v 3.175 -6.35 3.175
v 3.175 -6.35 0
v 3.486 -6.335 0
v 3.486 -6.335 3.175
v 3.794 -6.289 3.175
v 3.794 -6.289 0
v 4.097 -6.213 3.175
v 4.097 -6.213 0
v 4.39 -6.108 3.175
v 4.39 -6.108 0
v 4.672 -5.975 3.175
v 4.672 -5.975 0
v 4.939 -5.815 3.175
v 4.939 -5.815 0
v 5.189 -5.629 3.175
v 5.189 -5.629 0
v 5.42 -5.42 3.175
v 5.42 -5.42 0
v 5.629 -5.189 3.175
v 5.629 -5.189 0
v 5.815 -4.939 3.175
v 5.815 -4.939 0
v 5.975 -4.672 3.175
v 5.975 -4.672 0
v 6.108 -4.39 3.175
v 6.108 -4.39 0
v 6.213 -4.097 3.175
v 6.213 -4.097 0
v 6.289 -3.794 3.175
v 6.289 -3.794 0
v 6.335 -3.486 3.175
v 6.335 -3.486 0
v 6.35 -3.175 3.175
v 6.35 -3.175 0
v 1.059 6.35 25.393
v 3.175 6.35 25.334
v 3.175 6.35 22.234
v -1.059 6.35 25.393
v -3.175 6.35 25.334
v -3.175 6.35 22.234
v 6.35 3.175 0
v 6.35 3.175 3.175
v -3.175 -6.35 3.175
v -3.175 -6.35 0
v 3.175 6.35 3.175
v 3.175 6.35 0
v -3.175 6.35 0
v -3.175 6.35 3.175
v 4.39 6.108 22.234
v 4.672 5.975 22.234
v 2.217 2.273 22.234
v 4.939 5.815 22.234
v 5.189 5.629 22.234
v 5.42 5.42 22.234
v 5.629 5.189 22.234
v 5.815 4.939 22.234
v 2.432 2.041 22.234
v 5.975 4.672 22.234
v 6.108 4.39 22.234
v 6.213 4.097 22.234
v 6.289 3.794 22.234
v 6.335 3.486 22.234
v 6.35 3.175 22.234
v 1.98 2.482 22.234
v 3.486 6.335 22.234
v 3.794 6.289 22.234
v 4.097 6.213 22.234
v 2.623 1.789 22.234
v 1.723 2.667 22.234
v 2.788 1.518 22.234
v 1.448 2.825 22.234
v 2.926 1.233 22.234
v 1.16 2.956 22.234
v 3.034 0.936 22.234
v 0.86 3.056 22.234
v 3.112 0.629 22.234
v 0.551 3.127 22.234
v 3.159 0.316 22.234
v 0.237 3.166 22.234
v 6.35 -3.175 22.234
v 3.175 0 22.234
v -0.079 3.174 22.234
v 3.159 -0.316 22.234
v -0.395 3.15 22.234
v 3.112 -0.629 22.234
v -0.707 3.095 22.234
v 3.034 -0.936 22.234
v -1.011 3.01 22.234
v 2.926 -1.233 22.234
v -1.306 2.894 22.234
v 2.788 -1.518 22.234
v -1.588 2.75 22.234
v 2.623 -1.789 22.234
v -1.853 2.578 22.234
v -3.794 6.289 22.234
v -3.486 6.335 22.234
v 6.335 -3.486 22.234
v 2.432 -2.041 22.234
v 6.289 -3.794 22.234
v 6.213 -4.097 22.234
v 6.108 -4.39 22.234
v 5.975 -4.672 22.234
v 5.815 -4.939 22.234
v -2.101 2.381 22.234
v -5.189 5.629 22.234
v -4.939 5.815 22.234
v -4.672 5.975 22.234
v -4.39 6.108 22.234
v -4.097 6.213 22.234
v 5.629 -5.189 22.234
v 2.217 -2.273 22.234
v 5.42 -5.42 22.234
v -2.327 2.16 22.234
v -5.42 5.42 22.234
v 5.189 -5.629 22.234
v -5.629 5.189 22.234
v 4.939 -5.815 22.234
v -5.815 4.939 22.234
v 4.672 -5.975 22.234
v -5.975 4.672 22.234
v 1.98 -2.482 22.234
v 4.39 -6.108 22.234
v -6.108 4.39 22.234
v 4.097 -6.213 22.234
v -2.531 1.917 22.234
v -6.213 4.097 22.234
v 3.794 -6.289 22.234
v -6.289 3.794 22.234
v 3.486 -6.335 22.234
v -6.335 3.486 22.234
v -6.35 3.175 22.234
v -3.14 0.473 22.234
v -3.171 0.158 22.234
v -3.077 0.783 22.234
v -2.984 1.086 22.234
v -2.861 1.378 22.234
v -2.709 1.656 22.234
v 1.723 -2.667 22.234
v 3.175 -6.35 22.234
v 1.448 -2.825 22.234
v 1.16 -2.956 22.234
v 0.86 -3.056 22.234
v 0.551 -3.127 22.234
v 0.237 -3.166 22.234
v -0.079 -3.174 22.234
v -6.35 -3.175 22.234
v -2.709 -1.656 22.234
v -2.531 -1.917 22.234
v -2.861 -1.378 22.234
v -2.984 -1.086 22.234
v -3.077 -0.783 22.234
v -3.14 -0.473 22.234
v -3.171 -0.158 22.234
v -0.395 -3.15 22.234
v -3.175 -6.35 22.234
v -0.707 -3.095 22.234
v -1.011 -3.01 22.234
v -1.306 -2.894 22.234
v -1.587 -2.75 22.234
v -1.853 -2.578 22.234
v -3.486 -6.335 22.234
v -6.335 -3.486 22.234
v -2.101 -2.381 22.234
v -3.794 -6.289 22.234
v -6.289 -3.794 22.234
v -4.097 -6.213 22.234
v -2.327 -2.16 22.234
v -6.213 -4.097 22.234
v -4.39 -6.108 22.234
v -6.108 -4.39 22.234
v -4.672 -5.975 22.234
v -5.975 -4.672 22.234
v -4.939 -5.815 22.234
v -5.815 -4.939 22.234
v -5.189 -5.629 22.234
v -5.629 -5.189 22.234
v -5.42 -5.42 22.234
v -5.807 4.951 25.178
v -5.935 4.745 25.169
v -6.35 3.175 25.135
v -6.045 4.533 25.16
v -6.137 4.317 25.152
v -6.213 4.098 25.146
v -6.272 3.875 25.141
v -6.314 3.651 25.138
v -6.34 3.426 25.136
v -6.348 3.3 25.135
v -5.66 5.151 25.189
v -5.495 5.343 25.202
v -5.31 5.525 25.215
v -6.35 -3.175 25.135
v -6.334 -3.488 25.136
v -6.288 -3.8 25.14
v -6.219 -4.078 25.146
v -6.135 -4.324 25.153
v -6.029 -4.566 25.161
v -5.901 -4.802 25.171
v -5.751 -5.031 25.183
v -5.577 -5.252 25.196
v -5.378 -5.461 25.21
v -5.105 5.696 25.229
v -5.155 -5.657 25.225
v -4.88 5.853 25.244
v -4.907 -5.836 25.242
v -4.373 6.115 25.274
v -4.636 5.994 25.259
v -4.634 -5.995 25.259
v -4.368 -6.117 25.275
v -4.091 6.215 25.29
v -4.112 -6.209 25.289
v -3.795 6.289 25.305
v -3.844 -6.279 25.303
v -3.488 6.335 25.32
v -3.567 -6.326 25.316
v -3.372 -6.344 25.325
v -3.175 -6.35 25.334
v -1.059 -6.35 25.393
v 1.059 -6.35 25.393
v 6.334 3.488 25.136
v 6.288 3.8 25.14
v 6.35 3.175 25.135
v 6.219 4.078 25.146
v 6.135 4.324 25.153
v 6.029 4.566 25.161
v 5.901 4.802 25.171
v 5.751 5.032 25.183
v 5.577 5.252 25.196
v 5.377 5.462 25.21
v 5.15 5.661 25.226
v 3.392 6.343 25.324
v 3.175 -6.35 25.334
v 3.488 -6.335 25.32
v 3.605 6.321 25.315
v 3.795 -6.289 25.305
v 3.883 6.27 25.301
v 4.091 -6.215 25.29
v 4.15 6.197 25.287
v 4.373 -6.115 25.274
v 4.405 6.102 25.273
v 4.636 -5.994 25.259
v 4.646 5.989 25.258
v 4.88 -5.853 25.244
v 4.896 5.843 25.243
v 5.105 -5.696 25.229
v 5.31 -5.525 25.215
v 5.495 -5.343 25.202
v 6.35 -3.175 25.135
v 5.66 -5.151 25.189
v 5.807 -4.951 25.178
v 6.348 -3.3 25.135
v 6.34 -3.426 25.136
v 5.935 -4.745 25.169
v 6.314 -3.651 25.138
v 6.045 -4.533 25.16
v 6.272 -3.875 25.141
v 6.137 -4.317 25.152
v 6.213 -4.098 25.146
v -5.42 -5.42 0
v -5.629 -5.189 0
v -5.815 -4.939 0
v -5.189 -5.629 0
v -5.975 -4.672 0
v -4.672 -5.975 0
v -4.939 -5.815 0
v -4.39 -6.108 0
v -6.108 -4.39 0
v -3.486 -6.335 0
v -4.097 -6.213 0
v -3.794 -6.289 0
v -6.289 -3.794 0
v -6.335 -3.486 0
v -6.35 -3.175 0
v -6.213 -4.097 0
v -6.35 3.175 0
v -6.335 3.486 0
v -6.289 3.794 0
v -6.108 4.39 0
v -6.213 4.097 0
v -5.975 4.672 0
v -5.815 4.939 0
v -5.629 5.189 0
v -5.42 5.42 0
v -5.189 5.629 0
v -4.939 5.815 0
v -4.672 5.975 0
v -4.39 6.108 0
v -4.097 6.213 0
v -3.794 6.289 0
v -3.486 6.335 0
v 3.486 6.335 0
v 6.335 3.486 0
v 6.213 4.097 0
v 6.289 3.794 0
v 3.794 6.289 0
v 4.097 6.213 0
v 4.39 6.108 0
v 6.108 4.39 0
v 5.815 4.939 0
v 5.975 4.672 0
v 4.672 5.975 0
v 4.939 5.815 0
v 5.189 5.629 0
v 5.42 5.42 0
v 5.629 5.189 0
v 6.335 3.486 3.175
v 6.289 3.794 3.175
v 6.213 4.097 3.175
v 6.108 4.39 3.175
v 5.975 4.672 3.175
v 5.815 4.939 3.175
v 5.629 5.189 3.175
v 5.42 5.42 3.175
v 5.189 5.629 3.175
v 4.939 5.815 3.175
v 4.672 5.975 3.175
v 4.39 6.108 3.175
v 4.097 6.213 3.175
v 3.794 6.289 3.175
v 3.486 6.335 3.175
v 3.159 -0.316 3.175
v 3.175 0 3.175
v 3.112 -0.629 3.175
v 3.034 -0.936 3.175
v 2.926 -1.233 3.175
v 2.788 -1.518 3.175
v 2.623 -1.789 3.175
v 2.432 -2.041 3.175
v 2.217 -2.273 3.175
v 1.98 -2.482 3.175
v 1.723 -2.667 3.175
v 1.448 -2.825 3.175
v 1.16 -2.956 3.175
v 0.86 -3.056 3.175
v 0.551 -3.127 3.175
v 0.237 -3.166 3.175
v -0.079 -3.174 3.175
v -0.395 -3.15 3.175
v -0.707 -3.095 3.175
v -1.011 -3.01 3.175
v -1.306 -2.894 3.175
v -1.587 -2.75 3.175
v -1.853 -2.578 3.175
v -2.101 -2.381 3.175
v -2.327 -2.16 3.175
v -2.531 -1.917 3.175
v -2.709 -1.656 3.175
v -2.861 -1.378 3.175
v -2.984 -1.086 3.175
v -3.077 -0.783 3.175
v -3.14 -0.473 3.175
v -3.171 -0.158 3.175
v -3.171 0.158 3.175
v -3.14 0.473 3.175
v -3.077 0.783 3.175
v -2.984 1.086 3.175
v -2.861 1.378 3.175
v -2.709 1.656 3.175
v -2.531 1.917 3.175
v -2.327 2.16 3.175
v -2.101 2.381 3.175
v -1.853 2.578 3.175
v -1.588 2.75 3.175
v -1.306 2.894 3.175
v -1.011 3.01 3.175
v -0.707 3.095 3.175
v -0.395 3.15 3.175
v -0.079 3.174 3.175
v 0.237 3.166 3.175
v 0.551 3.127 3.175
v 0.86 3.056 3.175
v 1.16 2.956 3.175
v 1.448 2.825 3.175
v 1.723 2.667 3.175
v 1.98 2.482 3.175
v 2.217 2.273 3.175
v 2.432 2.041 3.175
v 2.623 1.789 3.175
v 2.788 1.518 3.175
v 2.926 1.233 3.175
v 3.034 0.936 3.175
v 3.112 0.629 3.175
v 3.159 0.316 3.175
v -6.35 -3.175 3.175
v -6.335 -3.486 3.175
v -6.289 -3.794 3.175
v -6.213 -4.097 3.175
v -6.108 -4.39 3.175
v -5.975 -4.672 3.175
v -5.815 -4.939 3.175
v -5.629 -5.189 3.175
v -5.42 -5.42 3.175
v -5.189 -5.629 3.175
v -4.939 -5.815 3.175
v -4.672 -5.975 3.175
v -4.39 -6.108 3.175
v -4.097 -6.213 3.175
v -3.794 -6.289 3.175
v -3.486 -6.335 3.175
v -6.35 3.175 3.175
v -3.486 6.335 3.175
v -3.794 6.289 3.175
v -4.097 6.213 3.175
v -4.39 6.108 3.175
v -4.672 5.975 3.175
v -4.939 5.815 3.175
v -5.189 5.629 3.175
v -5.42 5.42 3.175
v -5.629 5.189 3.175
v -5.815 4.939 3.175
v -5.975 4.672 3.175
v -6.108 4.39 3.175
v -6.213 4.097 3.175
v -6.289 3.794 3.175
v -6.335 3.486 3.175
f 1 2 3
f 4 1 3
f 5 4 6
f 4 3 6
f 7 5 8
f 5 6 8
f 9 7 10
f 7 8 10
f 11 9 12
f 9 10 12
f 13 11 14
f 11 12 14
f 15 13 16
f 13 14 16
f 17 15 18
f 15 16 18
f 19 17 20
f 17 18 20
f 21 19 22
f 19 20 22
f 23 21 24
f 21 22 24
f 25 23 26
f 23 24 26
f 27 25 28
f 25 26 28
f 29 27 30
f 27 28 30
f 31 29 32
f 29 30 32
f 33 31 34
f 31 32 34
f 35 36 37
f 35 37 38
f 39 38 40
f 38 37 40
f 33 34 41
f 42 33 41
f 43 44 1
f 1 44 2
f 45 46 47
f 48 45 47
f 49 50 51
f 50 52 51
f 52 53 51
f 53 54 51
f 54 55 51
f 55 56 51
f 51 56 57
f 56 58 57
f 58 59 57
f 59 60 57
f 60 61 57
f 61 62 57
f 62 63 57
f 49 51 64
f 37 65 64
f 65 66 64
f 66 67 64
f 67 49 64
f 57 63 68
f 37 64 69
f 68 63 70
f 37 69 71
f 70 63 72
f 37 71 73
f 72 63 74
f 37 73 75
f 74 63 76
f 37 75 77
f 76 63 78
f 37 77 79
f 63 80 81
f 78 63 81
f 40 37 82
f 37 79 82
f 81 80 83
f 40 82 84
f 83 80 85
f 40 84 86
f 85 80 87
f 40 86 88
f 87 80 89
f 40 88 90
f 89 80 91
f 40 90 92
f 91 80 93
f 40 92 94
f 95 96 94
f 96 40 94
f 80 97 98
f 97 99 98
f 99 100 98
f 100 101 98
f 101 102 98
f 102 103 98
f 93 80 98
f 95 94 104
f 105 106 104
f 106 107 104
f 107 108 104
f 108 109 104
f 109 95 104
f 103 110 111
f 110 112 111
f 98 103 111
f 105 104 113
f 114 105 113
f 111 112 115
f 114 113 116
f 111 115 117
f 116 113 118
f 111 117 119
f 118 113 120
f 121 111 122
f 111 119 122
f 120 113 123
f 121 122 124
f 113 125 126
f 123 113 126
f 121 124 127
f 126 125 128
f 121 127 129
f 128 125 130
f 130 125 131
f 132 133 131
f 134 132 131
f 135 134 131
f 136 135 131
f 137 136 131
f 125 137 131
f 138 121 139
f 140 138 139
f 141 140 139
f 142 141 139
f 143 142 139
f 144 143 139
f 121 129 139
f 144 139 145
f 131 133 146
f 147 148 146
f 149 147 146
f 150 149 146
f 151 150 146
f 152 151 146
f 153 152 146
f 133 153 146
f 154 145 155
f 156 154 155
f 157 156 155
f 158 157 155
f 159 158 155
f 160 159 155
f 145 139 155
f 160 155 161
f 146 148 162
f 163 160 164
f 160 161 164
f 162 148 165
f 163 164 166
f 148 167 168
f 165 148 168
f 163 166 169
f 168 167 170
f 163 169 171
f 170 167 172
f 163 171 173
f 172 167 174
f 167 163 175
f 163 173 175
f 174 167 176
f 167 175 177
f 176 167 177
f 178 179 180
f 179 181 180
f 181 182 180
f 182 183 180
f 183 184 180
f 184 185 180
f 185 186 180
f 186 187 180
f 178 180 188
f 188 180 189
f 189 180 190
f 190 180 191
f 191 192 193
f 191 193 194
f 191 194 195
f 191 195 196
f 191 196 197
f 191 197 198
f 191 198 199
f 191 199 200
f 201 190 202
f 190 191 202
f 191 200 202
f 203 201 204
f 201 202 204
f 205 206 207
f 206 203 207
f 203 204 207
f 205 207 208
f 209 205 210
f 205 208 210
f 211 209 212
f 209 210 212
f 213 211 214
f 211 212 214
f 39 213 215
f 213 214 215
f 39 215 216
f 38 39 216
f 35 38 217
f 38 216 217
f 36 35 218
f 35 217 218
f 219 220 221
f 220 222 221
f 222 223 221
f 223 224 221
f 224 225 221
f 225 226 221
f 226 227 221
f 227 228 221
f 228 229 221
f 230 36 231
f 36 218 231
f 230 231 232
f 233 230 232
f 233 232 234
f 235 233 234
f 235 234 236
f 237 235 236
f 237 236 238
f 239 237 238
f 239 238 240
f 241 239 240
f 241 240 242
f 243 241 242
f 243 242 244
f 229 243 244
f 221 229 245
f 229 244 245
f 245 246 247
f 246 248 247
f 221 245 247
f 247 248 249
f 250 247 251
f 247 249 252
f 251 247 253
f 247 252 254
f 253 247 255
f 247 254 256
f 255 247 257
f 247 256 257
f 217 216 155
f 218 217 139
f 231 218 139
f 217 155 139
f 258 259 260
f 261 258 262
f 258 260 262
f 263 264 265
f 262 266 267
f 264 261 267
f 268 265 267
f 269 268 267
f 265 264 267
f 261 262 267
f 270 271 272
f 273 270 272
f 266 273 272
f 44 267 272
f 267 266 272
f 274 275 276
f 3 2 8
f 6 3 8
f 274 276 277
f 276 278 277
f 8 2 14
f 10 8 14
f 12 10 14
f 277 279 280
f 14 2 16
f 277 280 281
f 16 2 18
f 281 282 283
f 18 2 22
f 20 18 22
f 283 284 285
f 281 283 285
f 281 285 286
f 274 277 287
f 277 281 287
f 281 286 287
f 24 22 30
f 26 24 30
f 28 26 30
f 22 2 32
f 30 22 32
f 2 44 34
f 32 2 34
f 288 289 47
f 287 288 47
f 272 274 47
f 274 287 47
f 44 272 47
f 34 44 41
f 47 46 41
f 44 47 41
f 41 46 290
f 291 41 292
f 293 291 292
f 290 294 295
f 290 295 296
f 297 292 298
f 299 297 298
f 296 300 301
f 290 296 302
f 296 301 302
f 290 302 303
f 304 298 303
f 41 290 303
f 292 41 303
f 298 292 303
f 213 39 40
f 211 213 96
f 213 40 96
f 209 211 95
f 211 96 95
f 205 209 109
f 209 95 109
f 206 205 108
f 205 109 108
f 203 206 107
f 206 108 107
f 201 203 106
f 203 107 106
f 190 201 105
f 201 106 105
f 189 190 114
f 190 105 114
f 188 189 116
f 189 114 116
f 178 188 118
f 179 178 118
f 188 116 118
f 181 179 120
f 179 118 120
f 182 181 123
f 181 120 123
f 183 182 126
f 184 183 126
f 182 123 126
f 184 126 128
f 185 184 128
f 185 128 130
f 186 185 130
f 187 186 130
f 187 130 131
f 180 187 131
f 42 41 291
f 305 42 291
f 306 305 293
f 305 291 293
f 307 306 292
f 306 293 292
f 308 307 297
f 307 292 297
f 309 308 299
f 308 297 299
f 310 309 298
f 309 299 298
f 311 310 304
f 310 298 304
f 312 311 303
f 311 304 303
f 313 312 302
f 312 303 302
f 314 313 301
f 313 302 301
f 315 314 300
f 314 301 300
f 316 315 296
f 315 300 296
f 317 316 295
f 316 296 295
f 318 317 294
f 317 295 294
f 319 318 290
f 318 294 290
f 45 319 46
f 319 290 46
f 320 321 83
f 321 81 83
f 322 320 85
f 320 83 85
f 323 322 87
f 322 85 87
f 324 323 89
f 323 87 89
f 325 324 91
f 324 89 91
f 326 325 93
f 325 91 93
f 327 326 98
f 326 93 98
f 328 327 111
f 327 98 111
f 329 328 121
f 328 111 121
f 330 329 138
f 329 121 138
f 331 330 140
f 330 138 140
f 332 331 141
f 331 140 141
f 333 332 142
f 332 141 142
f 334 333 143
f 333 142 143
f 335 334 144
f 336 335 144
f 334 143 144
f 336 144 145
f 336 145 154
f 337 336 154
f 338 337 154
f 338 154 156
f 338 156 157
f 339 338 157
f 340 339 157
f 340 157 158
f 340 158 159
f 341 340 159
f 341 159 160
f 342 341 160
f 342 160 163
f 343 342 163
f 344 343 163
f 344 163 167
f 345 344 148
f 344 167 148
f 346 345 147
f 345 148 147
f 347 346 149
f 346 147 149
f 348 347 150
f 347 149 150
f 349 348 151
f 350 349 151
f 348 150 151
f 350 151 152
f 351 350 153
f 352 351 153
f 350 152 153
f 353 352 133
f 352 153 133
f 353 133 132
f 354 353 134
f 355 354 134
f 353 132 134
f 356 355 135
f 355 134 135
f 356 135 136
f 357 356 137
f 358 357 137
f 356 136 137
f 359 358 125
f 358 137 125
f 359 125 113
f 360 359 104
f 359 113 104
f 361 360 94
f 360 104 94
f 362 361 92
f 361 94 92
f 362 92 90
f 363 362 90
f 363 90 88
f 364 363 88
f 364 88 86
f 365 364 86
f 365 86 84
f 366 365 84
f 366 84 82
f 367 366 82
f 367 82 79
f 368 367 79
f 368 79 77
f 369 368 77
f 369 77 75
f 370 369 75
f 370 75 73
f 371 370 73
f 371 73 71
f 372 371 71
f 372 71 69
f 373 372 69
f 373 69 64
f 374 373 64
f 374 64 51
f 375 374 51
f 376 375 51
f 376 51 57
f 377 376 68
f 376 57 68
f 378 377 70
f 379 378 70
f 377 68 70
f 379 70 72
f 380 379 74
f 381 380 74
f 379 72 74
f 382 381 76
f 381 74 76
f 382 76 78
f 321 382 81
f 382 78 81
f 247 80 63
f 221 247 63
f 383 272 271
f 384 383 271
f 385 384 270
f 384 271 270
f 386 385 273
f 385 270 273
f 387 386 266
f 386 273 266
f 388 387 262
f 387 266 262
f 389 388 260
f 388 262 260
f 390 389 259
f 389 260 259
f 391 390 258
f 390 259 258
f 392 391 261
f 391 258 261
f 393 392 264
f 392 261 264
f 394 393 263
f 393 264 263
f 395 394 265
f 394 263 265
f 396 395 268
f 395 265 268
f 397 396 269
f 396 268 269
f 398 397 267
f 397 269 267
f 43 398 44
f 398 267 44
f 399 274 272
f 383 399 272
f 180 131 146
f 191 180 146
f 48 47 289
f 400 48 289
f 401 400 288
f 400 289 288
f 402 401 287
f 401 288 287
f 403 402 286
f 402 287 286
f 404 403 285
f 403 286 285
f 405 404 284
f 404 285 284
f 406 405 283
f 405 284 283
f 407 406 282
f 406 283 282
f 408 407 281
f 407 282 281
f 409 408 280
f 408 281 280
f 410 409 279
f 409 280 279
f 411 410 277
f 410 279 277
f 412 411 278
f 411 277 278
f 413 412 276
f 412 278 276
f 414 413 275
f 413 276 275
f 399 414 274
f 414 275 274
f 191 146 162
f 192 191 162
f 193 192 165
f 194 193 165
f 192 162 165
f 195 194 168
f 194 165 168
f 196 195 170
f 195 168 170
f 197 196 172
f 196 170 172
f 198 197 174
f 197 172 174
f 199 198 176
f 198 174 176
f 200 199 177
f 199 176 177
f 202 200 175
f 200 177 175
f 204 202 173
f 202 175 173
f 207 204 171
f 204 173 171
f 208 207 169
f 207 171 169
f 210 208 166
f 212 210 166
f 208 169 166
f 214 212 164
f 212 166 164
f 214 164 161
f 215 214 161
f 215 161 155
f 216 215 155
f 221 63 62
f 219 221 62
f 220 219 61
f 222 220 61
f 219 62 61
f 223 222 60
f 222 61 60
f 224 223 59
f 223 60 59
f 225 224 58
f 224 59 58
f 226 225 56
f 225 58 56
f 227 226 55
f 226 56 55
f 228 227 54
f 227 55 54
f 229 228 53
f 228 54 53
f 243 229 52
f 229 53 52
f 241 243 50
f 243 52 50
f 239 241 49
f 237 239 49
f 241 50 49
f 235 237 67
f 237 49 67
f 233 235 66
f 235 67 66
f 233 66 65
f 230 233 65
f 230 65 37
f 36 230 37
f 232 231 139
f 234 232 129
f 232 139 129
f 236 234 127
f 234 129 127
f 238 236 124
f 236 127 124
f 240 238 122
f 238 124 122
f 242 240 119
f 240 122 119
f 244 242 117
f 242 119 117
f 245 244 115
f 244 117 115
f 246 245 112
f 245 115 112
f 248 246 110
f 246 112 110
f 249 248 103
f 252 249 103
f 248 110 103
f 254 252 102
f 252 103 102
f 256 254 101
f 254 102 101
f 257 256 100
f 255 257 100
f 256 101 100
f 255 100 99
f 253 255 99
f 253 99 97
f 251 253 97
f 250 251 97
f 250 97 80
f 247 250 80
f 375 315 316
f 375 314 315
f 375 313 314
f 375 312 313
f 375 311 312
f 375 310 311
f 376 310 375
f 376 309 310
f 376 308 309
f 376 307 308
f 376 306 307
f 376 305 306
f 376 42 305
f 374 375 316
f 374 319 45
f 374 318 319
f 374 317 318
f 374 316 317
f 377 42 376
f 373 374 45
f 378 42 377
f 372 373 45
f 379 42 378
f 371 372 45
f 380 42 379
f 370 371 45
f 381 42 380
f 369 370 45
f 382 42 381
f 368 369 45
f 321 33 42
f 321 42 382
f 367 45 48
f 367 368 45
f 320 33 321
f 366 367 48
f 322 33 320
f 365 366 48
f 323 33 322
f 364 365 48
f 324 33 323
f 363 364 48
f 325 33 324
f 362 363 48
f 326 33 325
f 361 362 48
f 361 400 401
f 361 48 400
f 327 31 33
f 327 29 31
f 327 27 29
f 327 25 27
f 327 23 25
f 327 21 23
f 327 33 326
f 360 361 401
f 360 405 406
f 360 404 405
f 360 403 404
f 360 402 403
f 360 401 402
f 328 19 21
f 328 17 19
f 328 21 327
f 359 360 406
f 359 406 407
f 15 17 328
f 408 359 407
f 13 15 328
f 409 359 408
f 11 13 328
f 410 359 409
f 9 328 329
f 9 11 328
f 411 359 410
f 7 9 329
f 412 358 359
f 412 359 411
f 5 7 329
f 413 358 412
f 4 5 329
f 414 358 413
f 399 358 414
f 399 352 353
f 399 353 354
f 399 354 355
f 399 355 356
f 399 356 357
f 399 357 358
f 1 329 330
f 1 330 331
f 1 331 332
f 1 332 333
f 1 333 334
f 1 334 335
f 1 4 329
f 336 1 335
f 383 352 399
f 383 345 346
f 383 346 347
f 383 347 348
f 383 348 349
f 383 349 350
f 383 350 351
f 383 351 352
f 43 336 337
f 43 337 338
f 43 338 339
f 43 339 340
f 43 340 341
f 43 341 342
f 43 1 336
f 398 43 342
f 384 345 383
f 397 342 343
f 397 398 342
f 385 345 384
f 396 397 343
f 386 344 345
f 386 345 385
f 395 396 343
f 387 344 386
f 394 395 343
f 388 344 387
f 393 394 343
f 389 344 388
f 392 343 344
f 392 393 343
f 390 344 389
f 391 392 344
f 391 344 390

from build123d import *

# Parameters (mm, degrees)
F1_DEPTH = 25.4
F4_DEPTH = 25.4
F5_R     = 50.8
F6_DEPTH = 25.4
F7_W     = 11.8262093864
F7_H     = 19.0586867377


with BuildPart() as f1:
    # F0 (on Top) → F1 (new body)
    with BuildSketch(Plane.XY):
        with BuildLine():
            ThreePointArc((6.35, 3.175), (5.4200640303, 5.4200640303), (3.175, 6.35))
            Line((3.175, 6.35), (-3.175, 6.35))
            ThreePointArc((-3.175, 6.35), (-5.4200640303, 5.4200640303), (-6.35, 3.175))
            Line((-6.35, 3.175), (-6.35, -3.175))
            ThreePointArc((-6.35, -3.175), (-5.4200640303, -5.4200640303), (-3.175, -6.35))
            Line((-3.175, -6.35), (3.175, -6.35))
            ThreePointArc((3.175, -6.35), (5.4200640303, -5.4200640303), (6.35, -3.175))
            Line((6.35, -3.175), (6.35, 3.175))
        make_face()
    extrude(amount=F1_DEPTH)

    # F3 (on offset) → F4 (cut)
    with BuildSketch(Plane.XZ.offset(6.35)):
        with BuildLine():
            ThreePointArc((-43.2637086009, 11.9271194787), (1.858689826, 25.3773278091), (46.2714276243, 9.7425056106))
            Line((46.2714276243, 9.7425056106), (46.1867414415, 53.5595417023))
            Line((46.1867414415, 53.5595417023), (-43.2637086009, 53.5595417023))
            Line((-43.2637086009, 53.5595417023), (-43.2637086009, 11.9271194787))
        make_face()
    extrude(amount=-F4_DEPTH, mode=Mode.SUBTRACT)

    # F5 (on offset) → F6 (cut)
    with BuildSketch(Plane.XZ.offset(6.35)):
        with Locations((0, -50.8)):
            Circle(F5_R)
    extrude(amount=-F6_DEPTH, mode=Mode.SUBTRACT)

    # F7 (on Front) → F8 (revolve, cut)
    with BuildSketch(Plane.XZ):
        with Locations((9.0881046932, 12.7043433689)):
            Rectangle(F7_W, F7_H)
    revolve(axis=Axis((0, 0, 19.7457969189), (0, 0, -1)), mode=Mode.SUBTRACT)


solid = f1.part
